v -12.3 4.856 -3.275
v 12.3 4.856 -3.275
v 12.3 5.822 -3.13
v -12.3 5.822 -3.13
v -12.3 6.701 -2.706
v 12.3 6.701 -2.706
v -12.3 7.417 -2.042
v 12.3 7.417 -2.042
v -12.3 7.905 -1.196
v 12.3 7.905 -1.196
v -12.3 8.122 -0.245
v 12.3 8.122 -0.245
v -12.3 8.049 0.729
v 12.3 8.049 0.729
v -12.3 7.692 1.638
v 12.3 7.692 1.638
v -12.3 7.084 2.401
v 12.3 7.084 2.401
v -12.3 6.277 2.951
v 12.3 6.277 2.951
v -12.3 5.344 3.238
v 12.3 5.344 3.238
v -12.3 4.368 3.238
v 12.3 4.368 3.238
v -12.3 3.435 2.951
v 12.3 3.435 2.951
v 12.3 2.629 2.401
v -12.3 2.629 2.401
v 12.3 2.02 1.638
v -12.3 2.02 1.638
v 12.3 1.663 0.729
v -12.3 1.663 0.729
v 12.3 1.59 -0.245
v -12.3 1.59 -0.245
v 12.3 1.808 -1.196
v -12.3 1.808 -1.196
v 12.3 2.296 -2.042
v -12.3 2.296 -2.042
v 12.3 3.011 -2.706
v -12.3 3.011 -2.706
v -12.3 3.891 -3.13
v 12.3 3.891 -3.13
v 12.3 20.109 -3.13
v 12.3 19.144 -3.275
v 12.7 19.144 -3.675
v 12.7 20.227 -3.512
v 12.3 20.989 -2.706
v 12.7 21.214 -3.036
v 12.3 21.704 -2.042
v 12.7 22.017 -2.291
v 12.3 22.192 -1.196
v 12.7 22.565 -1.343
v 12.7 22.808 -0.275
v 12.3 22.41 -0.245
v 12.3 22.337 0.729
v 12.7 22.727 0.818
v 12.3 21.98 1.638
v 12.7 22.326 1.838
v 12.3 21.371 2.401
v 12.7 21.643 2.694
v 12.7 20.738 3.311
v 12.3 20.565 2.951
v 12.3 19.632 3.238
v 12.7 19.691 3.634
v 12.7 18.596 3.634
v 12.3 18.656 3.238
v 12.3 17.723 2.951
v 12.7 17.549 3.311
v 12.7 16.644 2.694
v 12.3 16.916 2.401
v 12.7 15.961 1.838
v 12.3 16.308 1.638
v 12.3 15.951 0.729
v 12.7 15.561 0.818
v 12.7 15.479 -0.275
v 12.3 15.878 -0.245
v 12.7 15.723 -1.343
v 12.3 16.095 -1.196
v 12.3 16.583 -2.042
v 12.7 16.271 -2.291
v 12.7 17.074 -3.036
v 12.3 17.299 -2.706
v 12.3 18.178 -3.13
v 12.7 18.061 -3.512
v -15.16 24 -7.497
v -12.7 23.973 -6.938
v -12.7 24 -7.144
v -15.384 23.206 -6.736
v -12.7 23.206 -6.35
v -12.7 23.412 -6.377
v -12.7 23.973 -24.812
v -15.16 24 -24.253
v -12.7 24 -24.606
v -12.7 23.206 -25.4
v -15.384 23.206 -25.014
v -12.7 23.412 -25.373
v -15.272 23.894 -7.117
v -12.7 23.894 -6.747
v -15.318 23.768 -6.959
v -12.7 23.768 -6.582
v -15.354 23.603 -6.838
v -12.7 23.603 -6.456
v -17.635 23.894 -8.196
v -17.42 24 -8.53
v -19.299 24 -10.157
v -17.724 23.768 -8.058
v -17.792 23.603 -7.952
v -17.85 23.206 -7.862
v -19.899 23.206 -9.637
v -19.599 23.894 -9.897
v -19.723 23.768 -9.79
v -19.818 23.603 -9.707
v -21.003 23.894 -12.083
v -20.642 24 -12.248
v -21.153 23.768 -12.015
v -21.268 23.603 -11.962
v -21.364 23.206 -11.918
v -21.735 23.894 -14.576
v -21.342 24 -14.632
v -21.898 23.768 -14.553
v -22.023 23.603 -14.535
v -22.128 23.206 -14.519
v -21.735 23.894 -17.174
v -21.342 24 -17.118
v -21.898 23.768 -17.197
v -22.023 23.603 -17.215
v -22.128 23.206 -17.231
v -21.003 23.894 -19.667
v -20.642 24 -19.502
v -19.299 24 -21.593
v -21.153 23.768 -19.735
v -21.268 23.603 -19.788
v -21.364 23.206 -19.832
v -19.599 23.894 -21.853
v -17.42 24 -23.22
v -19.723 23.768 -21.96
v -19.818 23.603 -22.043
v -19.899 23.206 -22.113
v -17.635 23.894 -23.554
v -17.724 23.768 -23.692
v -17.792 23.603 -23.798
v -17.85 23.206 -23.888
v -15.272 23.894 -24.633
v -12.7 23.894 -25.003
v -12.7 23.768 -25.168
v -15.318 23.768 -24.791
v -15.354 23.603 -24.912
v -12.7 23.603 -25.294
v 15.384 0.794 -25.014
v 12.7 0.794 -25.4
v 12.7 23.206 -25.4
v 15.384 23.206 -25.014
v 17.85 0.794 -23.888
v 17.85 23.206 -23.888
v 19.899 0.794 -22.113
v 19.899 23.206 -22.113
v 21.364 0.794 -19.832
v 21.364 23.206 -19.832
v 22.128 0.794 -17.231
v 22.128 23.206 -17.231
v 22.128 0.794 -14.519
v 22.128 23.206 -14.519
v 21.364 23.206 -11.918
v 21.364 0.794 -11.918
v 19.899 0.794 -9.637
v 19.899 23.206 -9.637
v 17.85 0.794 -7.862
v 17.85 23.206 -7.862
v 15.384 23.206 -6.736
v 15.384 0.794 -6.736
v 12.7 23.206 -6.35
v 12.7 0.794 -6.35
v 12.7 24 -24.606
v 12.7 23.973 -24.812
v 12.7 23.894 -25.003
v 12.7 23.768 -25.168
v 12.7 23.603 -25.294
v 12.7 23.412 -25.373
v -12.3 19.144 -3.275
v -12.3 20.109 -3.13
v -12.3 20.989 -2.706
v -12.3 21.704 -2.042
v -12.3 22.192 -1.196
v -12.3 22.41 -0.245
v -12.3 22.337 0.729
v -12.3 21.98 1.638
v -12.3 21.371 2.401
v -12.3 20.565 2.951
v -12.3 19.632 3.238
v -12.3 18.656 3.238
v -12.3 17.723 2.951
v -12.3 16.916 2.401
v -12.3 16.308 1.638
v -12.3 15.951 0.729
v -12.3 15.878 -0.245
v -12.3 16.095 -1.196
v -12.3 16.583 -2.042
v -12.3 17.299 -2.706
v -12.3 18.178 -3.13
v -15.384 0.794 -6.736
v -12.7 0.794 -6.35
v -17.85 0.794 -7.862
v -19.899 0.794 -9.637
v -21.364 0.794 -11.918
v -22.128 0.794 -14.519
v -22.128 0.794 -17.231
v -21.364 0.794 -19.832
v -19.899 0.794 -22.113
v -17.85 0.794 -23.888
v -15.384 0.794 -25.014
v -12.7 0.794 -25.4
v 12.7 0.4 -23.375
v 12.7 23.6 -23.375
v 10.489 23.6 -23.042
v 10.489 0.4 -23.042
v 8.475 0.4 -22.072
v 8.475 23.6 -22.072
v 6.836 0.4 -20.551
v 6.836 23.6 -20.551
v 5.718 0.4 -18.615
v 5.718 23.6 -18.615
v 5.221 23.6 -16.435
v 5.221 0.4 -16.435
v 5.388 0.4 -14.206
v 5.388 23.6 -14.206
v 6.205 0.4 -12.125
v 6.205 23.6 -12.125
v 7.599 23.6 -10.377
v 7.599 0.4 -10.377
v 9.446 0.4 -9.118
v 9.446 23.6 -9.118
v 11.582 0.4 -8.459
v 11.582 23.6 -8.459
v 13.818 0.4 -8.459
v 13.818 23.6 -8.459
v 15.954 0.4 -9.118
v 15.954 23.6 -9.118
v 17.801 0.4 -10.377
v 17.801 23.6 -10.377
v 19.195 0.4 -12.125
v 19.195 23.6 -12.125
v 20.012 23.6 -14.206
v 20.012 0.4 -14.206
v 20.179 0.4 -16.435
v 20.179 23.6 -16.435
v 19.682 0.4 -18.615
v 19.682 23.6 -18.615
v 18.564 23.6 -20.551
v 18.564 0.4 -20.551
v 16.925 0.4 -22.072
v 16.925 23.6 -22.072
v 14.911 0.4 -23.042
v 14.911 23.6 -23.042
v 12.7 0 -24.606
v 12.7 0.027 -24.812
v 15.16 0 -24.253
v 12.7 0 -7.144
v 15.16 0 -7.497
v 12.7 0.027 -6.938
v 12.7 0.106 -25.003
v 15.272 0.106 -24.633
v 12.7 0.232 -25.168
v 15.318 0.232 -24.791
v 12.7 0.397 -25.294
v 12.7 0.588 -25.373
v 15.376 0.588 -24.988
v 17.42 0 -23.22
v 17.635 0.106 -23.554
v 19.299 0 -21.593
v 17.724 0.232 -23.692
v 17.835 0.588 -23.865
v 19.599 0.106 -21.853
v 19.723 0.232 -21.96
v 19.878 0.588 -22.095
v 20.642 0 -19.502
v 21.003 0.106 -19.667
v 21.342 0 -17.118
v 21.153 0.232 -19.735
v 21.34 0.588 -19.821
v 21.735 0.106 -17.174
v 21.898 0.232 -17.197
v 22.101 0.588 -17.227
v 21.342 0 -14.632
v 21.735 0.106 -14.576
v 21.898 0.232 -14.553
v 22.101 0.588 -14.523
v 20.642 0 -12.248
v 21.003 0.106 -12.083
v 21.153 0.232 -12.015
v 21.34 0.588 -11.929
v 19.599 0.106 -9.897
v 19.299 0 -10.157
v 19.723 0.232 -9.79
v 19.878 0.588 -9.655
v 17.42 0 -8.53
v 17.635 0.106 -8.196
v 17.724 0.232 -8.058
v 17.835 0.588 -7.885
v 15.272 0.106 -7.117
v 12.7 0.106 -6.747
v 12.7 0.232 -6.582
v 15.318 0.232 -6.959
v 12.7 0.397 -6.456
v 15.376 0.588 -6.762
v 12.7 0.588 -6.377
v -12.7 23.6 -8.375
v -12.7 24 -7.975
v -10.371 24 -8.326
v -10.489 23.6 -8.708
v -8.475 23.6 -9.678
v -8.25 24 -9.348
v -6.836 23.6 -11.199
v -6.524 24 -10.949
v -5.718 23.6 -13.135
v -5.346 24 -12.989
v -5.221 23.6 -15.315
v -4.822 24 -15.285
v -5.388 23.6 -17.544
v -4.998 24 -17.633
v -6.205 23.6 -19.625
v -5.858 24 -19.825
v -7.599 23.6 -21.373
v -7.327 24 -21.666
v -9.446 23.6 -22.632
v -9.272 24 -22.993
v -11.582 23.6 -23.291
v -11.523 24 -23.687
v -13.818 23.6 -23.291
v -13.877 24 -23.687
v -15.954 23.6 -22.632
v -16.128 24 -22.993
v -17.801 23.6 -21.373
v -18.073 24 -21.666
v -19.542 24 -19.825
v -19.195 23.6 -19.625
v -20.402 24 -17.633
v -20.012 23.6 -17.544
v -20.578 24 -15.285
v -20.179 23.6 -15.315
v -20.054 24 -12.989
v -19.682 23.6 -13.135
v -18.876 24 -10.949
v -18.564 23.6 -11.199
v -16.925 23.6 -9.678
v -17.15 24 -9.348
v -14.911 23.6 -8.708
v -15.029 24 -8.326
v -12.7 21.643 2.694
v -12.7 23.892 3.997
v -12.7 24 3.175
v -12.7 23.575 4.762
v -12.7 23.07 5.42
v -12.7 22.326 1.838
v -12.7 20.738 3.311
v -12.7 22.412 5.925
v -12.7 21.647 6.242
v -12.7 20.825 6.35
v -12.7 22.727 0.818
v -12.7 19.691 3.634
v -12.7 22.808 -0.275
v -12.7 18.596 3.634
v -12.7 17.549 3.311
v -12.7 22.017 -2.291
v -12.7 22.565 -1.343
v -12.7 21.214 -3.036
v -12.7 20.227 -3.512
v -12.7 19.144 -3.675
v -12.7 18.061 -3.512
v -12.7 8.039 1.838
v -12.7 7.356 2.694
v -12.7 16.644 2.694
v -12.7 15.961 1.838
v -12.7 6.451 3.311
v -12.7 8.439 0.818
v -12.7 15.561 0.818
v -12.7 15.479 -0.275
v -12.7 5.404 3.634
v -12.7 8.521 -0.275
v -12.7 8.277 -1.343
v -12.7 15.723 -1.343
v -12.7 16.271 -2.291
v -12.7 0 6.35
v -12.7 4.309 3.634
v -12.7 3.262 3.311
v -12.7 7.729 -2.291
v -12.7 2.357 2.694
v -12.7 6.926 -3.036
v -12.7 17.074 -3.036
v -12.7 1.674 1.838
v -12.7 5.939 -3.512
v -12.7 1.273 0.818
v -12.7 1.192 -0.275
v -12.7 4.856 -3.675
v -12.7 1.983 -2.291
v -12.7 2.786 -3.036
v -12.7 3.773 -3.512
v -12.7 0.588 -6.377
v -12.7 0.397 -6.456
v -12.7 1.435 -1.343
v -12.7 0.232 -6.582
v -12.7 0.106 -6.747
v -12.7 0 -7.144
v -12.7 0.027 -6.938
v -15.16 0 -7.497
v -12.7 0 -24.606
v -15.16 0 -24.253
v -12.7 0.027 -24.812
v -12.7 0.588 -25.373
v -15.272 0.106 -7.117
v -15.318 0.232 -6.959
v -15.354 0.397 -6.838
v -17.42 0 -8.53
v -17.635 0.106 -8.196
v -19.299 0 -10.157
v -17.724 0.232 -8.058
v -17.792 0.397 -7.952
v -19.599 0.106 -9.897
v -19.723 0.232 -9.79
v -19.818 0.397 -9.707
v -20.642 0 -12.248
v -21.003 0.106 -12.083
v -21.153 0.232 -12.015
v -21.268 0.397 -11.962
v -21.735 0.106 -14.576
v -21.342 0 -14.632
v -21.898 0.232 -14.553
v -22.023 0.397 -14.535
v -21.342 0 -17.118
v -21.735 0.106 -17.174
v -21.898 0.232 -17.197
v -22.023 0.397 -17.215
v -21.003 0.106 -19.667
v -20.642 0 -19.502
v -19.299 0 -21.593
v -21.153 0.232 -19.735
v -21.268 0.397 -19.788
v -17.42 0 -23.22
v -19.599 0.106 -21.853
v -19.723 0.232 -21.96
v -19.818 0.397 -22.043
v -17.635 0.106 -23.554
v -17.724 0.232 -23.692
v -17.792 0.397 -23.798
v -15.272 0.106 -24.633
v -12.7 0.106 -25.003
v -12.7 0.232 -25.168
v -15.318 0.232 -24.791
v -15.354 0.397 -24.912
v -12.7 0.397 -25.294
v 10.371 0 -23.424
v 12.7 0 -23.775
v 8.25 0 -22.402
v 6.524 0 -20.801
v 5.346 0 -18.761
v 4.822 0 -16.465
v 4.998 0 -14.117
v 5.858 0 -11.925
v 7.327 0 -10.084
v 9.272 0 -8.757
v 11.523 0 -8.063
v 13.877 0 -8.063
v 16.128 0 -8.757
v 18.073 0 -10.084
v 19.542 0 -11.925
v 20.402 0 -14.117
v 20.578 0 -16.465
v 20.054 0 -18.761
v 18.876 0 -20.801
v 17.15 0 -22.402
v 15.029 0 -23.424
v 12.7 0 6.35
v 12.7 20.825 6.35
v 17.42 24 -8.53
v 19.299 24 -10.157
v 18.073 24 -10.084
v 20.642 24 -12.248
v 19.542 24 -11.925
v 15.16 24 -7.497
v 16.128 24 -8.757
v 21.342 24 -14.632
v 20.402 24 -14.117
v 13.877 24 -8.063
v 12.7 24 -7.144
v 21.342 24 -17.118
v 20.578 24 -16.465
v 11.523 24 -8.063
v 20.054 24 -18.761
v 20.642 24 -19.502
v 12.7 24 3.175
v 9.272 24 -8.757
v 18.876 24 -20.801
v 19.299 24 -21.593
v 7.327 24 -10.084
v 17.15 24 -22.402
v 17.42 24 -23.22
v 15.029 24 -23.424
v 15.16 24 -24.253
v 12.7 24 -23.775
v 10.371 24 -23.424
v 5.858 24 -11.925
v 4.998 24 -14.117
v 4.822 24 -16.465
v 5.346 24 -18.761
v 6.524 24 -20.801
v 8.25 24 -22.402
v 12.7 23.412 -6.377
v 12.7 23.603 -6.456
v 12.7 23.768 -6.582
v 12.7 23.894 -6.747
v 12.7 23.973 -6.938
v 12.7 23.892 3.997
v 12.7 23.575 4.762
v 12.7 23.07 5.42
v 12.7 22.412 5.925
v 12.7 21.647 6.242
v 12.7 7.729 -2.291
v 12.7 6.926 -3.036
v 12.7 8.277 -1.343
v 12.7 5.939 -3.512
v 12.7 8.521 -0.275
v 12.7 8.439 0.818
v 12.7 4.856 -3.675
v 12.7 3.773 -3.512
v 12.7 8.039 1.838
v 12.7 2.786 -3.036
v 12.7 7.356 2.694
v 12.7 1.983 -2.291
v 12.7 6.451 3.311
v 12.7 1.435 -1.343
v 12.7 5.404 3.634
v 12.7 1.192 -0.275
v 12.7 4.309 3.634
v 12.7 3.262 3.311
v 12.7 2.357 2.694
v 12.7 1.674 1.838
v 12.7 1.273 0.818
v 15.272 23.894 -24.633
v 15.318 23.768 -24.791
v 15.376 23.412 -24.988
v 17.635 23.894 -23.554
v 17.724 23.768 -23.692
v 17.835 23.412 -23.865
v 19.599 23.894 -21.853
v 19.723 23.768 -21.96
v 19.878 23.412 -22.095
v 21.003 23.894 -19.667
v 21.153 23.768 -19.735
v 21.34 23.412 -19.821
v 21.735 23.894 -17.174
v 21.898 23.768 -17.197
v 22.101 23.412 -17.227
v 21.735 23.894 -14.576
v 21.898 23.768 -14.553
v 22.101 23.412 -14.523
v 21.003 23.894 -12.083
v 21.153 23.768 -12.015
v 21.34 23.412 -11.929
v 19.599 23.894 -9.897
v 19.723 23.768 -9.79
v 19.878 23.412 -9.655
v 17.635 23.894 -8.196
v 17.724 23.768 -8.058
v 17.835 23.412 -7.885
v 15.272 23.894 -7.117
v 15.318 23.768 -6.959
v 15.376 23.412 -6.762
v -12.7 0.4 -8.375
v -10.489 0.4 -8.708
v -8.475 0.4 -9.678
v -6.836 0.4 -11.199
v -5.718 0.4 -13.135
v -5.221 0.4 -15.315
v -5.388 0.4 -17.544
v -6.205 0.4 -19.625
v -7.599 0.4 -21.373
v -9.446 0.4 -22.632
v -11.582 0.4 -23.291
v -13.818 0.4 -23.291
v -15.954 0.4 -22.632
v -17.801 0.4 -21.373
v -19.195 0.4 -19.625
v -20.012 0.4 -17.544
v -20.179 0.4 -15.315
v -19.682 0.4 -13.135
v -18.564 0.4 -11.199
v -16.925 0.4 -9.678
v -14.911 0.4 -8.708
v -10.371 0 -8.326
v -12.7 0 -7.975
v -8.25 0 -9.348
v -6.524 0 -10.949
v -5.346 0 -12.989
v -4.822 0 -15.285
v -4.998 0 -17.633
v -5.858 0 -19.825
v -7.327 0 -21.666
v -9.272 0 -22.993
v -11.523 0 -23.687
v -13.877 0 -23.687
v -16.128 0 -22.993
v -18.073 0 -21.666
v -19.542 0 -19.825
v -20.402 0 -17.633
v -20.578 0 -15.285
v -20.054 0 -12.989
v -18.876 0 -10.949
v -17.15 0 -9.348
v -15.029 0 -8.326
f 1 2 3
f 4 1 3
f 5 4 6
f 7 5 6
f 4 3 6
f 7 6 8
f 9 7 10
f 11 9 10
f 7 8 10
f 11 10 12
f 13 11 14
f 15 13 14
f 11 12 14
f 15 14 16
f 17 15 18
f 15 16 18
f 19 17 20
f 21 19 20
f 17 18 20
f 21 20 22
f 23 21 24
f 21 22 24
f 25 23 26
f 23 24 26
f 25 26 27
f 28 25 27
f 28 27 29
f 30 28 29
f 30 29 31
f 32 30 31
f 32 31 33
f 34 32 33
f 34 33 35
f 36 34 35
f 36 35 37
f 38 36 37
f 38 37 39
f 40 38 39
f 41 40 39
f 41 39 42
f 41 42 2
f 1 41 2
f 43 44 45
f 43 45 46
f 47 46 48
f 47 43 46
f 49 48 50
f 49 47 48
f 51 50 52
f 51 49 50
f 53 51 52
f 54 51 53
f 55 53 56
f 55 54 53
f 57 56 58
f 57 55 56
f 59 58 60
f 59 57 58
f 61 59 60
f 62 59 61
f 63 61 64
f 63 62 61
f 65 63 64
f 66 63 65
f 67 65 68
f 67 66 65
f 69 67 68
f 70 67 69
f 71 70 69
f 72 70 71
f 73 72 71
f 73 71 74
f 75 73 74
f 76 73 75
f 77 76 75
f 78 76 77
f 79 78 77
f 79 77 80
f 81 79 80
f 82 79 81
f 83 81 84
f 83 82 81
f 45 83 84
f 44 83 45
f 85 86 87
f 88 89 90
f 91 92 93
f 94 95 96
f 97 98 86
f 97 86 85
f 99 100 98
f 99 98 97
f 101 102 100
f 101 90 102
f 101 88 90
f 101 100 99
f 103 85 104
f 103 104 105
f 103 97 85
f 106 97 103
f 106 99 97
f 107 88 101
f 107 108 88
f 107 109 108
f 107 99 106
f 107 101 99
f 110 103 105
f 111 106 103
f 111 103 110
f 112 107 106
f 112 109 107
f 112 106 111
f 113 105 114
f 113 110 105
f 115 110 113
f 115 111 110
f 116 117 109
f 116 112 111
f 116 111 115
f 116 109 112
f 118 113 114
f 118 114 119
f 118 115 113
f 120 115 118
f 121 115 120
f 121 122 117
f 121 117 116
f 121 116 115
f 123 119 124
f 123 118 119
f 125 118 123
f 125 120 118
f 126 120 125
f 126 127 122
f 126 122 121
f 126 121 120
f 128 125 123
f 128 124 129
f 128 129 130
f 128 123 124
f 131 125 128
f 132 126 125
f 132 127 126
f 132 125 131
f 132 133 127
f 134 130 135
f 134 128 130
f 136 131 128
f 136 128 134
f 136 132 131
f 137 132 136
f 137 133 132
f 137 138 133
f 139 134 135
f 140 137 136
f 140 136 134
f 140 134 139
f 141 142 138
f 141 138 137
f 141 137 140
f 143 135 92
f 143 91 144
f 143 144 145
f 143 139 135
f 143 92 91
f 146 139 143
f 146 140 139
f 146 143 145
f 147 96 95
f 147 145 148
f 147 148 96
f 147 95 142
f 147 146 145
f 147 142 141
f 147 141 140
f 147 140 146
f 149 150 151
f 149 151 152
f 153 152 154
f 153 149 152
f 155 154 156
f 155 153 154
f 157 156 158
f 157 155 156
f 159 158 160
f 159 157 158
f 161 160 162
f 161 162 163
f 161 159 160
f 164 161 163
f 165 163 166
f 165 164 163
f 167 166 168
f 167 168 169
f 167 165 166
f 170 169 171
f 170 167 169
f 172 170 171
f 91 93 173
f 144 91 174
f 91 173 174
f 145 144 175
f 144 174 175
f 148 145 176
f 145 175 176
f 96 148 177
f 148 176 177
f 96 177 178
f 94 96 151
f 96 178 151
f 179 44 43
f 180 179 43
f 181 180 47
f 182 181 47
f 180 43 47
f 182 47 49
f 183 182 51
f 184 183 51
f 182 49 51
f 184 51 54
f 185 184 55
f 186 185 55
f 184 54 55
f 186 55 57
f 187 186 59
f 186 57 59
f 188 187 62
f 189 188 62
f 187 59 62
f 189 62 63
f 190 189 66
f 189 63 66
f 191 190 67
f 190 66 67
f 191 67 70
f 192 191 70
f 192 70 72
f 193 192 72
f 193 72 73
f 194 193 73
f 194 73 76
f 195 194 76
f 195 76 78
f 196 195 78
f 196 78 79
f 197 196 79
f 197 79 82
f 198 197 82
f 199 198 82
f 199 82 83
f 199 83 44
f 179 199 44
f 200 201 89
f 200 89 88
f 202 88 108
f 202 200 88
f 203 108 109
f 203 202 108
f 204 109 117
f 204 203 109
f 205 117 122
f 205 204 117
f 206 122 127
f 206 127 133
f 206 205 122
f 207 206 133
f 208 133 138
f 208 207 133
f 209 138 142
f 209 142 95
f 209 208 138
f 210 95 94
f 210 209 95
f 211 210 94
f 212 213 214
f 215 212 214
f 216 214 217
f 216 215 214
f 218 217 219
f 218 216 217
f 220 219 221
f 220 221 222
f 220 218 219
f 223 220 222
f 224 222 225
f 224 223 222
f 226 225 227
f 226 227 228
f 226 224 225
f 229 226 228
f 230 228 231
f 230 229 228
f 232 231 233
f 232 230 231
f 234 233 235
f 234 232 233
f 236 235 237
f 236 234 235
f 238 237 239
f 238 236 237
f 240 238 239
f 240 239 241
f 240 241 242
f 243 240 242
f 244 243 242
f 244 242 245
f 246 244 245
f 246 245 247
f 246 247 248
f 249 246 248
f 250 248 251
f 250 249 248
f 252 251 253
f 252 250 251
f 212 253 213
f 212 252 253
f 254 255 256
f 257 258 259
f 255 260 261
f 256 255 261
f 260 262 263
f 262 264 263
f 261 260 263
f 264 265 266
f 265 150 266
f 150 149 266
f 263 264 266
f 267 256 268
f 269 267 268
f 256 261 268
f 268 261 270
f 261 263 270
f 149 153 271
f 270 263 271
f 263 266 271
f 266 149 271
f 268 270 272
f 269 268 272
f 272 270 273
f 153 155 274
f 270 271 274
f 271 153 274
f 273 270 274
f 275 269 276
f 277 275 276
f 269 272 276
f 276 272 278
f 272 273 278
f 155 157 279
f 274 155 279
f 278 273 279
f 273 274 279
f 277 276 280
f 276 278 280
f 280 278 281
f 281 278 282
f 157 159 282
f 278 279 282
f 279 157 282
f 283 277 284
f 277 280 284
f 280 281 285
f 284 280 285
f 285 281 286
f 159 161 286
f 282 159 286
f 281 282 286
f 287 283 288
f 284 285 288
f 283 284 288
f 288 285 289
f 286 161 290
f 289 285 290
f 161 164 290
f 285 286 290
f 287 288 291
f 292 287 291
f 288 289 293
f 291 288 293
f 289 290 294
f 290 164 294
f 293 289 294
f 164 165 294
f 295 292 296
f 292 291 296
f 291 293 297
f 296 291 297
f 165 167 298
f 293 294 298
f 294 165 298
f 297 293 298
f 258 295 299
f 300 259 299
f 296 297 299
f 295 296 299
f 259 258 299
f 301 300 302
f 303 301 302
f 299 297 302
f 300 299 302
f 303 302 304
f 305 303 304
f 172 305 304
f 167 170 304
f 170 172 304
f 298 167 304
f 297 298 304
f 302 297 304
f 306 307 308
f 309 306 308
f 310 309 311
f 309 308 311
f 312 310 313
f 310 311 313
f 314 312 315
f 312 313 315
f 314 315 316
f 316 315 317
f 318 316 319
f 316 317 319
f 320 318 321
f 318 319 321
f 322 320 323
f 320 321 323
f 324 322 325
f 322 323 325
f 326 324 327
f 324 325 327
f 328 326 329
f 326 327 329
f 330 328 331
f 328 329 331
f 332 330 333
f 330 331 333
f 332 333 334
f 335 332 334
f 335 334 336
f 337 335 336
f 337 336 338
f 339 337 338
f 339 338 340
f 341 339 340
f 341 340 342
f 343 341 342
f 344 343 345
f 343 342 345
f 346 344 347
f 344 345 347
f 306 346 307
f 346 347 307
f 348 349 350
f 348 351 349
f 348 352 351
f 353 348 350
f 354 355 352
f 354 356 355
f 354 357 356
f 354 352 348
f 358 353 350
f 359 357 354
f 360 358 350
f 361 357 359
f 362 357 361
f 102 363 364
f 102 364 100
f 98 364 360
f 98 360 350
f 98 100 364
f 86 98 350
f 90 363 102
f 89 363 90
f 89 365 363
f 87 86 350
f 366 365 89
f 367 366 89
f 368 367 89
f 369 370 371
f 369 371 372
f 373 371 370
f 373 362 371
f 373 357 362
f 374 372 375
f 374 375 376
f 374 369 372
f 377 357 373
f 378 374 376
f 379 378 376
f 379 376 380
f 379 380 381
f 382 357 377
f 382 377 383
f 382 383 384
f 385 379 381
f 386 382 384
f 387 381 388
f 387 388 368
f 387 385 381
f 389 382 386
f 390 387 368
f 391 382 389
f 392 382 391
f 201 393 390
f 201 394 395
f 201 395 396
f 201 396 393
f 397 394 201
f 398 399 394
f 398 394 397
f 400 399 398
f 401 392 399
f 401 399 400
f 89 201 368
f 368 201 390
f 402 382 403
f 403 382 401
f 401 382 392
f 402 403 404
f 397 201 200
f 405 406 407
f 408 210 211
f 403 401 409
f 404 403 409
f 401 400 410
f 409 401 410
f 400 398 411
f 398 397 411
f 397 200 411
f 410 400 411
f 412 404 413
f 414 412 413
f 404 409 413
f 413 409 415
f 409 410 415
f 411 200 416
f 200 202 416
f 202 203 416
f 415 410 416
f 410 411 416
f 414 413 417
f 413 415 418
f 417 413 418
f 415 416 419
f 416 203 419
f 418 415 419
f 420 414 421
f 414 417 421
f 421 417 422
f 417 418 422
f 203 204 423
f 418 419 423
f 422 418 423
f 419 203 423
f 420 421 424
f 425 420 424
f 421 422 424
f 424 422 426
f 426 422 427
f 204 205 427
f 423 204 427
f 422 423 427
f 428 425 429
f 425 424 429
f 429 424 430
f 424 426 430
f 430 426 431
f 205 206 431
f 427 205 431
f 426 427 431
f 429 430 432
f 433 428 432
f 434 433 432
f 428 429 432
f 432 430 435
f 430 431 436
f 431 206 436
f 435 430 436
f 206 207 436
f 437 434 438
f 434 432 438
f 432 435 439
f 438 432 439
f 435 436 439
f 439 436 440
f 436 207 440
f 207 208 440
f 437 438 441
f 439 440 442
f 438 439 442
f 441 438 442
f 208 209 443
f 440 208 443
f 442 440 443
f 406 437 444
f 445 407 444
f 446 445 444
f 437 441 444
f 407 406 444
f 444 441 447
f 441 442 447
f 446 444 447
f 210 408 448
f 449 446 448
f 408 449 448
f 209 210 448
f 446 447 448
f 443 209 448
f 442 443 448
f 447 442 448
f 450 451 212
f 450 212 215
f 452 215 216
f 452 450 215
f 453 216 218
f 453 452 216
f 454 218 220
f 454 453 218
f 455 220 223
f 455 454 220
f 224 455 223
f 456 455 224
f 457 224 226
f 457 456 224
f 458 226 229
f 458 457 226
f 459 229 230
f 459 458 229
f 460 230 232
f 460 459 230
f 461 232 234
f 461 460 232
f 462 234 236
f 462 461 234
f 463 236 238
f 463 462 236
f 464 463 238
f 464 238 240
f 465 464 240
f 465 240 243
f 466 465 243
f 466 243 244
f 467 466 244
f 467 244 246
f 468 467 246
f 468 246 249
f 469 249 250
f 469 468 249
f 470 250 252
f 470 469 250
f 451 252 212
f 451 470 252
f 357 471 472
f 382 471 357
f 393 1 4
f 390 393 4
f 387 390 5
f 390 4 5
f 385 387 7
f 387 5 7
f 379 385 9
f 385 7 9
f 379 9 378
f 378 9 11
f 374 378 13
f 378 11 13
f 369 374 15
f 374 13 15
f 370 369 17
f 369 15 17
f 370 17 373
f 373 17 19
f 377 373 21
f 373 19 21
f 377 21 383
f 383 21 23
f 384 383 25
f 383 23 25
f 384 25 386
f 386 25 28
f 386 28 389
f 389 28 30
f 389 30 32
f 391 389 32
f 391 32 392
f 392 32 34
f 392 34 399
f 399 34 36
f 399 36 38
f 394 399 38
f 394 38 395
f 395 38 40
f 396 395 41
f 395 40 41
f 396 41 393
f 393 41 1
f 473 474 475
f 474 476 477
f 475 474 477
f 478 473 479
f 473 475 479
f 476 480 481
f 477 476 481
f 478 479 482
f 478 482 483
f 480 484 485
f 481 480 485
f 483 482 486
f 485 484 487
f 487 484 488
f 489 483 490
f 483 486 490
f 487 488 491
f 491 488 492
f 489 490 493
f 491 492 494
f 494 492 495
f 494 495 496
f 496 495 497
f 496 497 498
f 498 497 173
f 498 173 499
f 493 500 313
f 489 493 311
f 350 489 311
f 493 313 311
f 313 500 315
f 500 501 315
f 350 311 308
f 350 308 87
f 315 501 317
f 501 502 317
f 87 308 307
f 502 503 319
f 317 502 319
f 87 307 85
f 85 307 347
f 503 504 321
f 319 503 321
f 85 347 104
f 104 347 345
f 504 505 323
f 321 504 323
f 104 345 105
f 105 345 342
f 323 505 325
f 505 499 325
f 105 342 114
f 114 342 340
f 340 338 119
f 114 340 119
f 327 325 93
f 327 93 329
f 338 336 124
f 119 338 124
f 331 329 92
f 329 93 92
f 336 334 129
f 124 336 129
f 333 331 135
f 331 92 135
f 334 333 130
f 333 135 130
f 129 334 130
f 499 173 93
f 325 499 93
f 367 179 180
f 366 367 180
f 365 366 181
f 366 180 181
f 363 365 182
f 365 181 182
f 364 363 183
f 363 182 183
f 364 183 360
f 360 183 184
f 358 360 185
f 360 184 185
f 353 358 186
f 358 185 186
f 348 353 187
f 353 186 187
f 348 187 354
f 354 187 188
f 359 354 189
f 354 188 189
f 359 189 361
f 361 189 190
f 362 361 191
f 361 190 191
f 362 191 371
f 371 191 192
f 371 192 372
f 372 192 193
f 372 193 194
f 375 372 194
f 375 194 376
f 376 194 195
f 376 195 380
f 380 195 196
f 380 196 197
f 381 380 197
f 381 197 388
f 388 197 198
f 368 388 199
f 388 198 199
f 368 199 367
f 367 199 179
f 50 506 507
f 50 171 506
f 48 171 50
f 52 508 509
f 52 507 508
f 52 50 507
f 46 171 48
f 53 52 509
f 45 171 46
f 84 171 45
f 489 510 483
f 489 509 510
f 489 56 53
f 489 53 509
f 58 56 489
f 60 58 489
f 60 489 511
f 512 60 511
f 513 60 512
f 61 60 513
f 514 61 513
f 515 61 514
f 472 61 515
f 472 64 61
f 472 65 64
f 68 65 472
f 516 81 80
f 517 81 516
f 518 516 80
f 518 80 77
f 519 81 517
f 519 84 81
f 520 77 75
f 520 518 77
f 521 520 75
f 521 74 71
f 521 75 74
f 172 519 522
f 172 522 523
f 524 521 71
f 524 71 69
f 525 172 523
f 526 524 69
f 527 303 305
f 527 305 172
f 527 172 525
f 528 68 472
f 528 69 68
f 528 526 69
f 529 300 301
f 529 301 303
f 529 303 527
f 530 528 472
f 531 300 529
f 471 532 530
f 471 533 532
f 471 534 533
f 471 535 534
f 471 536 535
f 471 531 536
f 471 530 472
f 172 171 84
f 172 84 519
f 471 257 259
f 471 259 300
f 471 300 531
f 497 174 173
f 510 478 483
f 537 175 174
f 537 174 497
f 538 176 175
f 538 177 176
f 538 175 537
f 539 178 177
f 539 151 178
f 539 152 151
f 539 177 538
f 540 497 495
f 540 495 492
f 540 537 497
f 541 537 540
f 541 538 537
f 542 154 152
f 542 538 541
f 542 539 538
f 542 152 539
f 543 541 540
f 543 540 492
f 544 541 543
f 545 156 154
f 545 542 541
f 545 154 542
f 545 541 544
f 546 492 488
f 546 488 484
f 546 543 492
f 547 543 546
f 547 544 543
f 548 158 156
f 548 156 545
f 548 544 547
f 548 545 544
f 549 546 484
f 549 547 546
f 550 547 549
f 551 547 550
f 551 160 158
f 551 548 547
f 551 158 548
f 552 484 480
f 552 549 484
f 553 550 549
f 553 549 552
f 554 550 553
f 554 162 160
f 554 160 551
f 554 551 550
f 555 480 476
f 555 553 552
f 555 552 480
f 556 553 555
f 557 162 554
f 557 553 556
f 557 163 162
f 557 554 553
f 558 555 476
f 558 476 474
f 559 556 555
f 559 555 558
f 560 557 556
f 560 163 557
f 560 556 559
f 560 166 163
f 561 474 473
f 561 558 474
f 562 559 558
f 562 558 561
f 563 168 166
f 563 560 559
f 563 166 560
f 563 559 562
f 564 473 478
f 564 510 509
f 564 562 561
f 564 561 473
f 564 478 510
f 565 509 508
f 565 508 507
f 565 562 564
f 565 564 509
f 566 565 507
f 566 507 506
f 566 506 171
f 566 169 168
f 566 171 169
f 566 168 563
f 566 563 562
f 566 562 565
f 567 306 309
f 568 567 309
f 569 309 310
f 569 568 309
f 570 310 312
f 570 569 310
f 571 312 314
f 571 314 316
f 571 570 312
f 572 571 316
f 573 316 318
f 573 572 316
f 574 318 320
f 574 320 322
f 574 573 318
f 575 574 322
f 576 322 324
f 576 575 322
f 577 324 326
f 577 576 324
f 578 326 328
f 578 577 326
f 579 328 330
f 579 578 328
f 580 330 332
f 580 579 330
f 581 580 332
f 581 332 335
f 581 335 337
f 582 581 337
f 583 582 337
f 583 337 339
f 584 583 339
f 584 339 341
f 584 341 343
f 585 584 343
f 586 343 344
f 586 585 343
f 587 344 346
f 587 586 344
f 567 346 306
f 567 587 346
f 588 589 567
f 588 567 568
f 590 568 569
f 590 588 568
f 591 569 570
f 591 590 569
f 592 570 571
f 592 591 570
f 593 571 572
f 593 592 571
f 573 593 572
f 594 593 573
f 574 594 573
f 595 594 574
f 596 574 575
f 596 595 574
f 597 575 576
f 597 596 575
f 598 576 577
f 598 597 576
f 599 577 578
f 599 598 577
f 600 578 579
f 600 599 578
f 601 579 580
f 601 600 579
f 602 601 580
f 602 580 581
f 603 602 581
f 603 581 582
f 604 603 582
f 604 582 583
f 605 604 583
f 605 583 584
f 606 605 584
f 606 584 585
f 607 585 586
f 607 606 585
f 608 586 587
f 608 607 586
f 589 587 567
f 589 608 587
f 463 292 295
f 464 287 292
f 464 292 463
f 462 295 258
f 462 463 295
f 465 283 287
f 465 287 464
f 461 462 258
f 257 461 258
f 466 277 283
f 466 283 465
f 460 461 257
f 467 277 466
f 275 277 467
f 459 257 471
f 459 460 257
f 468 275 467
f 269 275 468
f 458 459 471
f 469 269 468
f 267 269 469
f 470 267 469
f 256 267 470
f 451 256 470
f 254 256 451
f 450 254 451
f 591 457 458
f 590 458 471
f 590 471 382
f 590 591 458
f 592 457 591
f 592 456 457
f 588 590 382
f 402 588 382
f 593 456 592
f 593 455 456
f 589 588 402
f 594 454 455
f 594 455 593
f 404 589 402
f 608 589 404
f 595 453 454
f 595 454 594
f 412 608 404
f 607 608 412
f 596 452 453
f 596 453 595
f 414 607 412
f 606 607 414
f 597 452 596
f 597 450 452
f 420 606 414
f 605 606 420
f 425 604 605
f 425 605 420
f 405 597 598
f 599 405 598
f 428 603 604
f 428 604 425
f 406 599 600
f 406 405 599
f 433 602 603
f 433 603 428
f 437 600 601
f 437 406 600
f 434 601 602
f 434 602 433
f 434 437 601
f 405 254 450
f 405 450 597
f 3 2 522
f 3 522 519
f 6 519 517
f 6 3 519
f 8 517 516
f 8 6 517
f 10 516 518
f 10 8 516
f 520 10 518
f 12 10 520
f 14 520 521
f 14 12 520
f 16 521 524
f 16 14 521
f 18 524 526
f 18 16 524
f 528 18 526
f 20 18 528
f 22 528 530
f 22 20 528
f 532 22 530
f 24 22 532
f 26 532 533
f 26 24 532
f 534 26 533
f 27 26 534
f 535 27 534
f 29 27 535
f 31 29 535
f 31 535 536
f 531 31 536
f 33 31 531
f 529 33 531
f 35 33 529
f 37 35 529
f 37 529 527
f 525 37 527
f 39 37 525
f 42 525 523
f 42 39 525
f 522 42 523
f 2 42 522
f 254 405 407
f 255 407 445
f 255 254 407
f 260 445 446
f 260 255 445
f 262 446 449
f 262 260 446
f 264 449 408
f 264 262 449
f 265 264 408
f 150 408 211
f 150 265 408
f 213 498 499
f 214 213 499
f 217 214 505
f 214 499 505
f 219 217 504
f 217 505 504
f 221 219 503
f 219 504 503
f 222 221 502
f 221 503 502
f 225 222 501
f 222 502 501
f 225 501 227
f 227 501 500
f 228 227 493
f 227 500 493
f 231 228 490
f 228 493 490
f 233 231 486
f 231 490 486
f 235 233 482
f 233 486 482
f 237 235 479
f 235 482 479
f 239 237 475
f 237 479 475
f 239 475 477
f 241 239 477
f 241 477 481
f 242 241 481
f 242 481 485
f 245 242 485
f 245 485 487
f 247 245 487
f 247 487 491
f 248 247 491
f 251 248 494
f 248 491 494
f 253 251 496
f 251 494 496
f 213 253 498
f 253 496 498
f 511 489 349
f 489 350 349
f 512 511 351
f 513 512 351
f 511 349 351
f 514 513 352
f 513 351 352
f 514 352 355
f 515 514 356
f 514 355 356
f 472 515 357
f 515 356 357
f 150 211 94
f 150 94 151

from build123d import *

# Parameters (mm, degrees)
SKETCH1_R           = 7.5
BOSS_EXTRUDE1_DEPTH = 24
CHAMFER1_SIZE       = 0.4
FILLET2_R           = 3.175
SKETCH2_R           = 3.275
CUT_EXTRUDE1_DEPTH  = 50.405623415
CHAMFER2_SIZE       = 0.4
FILLET3_R           = 0.79375


with BuildPart() as part:
    # Sketch1 → Boss-Extrude1 (new body)
    with BuildSketch(Plane(origin=(0, 0, 0), x_dir=(1, 0, 0), z_dir=(0, 1, 0))):
        with BuildLine():
            Line((12.7, -6.35), (-12.7, -6.35))
            Line((-12.7, -6.35), (-12.7, 6.35))
            ThreePointArc((-12.7, 6.35), (-22.225, 15.875), (-12.7, 25.4))
            Line((-12.7, 25.4), (12.7, 25.4))
            ThreePointArc((12.7, 25.4), (22.225, 15.875), (12.7, 6.35))
            Line((12.7, 6.35), (12.7, -6.35))
        make_face()
        with Locations(Location((-12.7, 15.875, 0), (0, 0, 270))):
            Circle(SKETCH1_R, mode=Mode.SUBTRACT)
        with Locations(Location((12.7, 15.875, 0), (0, 0, 90))):
            Circle(SKETCH1_R, mode=Mode.SUBTRACT)
    extrude(amount=BOSS_EXTRUDE1_DEPTH)

    # Chamfer1
    chamfer1_edges = [part.edges().sort_by_distance(p)[0] for p in [
        (-12.7, 0, -23.375),
        (-12.7, 24, -23.375),
        (12.7, 0, -8.375),
        (12.7, 24, -8.375),
    ]]
    chamfer(chamfer1_edges, length=CHAMFER1_SIZE)

    # Fillet2
    fillet2_edges = [part.edges().sort_by_distance(p)[0] for p in [
        (0, 24, 6.35),
    ]]
    fillet(fillet2_edges, radius=FILLET2_R)

    # Sketch2 → Cut-Extrude1 (cut, through all)
    with BuildSketch(Plane(origin=(12.7, 0, 0), x_dir=(0, 0, -1), z_dir=(1, 0, 0))):
        with Locations((0, 19.14375)):
            Circle(SKETCH2_R)
        with Locations((0, 4.85625)):
            Circle(SKETCH2_R)
    extrude(amount=-CUT_EXTRUDE1_DEPTH, mode=Mode.SUBTRACT)

    # Chamfer2
    chamfer2_edges = [part.edges().sort_by_distance(p)[0] for p in [
        (-12.7, 19.14375, 3.275),
        (12.7, 19.14375, 3.275),
        (-12.7, 4.85625, 3.275),
        (12.7, 4.85625, 3.275),
    ]]
    chamfer(chamfer2_edges, length=CHAMFER2_SIZE)

    # Fillet3
    fillet3_edges = [part.edges().sort_by_distance(p)[0] for p in [
        (22.225, 24, -15.875),
        (0, 24, -25.4),
        (-22.225, 24, -15.875),
        (0, 0, -25.4),
        (22.225, 0, -15.875),
        (-22.225, 0, -15.875),
    ]]
    fillet(fillet3_edges, radius=FILLET3_R)


solid = part.part
